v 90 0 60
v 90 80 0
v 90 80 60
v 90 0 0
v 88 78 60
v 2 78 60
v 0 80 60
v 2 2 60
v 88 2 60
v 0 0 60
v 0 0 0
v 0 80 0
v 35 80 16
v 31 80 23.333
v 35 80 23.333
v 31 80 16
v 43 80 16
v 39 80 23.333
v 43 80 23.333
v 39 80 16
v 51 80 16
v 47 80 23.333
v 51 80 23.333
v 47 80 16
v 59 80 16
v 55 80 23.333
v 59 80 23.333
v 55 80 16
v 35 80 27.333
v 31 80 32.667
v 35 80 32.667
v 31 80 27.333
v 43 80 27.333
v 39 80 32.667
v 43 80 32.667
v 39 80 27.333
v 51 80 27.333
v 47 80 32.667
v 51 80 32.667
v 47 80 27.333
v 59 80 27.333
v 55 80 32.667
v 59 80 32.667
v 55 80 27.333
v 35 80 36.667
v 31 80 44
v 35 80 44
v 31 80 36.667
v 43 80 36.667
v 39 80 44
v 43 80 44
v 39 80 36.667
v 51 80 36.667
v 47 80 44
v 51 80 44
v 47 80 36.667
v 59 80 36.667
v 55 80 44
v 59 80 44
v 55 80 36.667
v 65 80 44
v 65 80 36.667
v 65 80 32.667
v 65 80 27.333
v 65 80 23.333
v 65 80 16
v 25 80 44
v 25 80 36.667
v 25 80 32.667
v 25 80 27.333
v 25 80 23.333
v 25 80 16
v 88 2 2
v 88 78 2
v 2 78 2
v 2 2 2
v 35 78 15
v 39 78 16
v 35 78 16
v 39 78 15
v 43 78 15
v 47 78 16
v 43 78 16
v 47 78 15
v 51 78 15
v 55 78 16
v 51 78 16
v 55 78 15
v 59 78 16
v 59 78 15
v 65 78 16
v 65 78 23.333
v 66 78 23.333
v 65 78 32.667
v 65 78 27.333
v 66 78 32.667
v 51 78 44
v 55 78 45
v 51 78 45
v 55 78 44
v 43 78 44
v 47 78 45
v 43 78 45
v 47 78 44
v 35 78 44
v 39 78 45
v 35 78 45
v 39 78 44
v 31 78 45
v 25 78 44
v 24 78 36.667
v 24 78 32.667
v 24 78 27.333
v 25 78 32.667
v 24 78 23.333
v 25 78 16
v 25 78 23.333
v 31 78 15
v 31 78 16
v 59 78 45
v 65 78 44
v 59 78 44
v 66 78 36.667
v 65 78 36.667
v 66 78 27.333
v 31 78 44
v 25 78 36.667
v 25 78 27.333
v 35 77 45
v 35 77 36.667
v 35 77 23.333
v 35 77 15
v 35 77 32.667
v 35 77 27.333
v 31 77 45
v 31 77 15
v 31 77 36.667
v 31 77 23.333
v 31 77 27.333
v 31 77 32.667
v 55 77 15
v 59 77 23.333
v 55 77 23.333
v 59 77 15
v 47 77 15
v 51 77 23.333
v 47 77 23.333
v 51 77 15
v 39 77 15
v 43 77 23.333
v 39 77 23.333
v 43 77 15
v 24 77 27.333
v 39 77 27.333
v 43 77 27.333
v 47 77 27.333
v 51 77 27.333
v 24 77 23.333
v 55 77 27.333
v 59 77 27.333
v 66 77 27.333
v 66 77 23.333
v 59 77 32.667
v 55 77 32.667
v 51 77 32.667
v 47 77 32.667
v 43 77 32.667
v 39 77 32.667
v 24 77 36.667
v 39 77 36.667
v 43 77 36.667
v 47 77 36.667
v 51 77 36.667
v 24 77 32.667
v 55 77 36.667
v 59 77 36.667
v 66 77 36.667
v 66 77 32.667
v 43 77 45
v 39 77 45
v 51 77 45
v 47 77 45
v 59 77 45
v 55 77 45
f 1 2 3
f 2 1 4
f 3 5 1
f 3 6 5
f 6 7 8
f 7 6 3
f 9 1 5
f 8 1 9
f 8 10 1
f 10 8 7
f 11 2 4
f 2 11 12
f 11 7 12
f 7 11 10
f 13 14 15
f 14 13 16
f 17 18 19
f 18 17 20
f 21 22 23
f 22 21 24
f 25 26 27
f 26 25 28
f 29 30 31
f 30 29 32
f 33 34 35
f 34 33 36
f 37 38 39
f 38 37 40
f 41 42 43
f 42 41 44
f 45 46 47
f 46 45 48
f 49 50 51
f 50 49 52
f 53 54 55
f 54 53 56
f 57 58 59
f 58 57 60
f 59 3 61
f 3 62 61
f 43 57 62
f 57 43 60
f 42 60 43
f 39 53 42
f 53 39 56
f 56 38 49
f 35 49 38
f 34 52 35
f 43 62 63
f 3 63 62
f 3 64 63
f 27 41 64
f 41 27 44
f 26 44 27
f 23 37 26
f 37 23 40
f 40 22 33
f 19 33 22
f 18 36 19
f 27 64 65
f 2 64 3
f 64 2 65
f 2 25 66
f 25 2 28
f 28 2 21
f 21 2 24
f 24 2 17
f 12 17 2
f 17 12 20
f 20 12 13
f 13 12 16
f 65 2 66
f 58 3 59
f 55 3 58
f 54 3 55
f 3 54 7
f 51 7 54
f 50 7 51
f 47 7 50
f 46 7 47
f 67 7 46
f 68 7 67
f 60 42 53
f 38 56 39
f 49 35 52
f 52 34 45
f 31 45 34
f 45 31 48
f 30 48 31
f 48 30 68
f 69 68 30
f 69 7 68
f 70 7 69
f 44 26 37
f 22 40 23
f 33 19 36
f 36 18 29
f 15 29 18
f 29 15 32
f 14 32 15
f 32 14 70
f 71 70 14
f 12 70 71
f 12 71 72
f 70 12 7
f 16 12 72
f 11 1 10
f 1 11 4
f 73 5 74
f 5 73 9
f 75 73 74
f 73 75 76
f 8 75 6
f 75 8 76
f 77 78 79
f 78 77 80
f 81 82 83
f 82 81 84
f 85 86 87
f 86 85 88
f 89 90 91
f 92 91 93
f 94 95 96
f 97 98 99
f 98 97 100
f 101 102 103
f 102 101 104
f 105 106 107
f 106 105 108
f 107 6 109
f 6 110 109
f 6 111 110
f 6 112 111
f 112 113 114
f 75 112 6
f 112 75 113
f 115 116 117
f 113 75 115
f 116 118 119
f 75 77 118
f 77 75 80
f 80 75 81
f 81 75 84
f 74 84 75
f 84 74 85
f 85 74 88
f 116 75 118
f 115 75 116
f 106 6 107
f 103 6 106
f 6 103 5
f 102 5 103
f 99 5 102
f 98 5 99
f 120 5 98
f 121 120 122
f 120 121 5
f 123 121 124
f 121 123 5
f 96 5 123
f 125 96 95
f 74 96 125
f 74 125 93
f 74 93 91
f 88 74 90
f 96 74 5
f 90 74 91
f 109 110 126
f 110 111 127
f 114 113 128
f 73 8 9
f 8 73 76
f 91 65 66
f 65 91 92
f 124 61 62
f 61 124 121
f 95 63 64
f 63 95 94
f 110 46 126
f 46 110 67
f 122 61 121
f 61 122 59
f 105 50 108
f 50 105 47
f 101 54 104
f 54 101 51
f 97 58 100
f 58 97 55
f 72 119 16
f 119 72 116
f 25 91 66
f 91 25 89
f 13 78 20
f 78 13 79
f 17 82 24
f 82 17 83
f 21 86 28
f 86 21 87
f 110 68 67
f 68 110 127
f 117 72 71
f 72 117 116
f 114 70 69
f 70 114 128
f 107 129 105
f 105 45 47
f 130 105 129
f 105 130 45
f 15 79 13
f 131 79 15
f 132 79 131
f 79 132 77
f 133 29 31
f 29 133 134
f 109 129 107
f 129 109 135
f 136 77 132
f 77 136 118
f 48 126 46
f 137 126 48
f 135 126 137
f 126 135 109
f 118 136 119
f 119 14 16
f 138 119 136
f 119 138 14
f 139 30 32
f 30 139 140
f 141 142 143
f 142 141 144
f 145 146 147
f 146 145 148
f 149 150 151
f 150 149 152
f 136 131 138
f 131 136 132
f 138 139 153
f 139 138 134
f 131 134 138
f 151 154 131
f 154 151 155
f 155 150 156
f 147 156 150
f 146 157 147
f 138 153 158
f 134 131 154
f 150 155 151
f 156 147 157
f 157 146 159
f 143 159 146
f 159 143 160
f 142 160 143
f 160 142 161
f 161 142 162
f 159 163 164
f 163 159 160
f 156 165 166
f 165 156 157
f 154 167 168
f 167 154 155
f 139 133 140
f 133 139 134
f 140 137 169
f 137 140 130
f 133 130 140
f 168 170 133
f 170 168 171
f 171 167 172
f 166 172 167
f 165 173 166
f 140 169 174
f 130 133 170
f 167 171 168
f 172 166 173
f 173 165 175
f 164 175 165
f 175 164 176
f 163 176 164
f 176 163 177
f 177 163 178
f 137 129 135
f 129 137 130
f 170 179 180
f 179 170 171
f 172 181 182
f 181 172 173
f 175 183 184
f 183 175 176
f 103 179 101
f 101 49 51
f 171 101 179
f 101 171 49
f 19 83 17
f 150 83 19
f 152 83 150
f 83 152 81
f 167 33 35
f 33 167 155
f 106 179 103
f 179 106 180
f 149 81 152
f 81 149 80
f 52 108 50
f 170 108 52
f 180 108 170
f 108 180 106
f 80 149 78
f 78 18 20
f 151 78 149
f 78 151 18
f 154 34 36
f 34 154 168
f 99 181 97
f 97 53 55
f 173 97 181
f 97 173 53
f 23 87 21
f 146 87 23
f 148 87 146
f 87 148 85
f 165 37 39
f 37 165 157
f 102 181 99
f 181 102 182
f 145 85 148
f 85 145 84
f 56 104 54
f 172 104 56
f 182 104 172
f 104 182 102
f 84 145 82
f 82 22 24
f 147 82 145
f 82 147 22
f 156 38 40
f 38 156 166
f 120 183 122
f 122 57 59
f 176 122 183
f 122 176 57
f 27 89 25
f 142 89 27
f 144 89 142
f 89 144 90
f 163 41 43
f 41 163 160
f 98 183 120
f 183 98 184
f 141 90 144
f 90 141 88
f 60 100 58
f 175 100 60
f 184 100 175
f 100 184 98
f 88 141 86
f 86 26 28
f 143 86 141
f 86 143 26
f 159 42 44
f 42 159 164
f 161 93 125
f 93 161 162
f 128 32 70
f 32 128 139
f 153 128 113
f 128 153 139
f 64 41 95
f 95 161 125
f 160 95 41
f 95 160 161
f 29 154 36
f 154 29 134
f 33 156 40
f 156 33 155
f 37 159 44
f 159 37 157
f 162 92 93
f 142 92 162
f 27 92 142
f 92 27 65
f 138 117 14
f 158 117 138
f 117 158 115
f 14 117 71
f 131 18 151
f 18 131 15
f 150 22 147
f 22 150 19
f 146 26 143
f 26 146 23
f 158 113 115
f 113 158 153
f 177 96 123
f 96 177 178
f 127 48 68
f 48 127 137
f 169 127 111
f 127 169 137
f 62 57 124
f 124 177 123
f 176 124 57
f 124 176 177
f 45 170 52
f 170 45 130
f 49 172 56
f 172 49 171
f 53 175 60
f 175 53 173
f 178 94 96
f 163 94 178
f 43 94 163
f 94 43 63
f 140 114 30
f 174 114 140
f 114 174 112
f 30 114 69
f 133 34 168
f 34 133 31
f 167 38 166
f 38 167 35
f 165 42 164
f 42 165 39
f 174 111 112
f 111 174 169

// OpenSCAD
$fn = 32;

// ----------------------------------------------------------------------
// Vent box: crossgrid enclosure
// ----------------------------------------------------------------------

// --- parameters (mm) ---
box_l = 90;               // box length, X
box_w = 80;               // box width, Y
box_h = 60;               // box height, Z
wall_t = 2;               // shell wall thickness
win_l = 40;               // vent window width, X
win_h = 28;               // vent window height, Z
bar_w = 4;                // grid bar width
n_v = 4;                  // vertical bar count
n_h = 2;                  // horizontal bar count

win_z0 = (box_h - win_h) / 2;  // window lower edge Z
v_step = win_l / (n_v + 1);  // vertical bar step
h_step = win_h / (n_h + 1);  // horizontal bar step

difference() {
  union() {
    difference() {
      cube([box_l, box_w, box_h]);
  translate([wall_t, wall_t, wall_t])
    cube([box_l - 2 * wall_t, box_w - 2 * wall_t, box_h]);
  translate([(box_l - win_l) / 2, box_w - wall_t - 1, win_z0])
    cube([win_l, wall_t + 2, win_h]);
    }
    for (i = [1 : n_v])
      translate([(box_l - win_l) / 2 + i * v_step - bar_w / 2,
                 box_w - wall_t - 1, win_z0 - 1])
        cube([bar_w, wall_t + 1, win_h + 2]);
    for (i = [1 : n_h])
      translate([(box_l - win_l) / 2 - 1, box_w - wall_t - 1,
                 win_z0 + i * h_step - bar_w / 2])
        cube([win_l + 2, wall_t + 1, bar_w]);
  }
}
